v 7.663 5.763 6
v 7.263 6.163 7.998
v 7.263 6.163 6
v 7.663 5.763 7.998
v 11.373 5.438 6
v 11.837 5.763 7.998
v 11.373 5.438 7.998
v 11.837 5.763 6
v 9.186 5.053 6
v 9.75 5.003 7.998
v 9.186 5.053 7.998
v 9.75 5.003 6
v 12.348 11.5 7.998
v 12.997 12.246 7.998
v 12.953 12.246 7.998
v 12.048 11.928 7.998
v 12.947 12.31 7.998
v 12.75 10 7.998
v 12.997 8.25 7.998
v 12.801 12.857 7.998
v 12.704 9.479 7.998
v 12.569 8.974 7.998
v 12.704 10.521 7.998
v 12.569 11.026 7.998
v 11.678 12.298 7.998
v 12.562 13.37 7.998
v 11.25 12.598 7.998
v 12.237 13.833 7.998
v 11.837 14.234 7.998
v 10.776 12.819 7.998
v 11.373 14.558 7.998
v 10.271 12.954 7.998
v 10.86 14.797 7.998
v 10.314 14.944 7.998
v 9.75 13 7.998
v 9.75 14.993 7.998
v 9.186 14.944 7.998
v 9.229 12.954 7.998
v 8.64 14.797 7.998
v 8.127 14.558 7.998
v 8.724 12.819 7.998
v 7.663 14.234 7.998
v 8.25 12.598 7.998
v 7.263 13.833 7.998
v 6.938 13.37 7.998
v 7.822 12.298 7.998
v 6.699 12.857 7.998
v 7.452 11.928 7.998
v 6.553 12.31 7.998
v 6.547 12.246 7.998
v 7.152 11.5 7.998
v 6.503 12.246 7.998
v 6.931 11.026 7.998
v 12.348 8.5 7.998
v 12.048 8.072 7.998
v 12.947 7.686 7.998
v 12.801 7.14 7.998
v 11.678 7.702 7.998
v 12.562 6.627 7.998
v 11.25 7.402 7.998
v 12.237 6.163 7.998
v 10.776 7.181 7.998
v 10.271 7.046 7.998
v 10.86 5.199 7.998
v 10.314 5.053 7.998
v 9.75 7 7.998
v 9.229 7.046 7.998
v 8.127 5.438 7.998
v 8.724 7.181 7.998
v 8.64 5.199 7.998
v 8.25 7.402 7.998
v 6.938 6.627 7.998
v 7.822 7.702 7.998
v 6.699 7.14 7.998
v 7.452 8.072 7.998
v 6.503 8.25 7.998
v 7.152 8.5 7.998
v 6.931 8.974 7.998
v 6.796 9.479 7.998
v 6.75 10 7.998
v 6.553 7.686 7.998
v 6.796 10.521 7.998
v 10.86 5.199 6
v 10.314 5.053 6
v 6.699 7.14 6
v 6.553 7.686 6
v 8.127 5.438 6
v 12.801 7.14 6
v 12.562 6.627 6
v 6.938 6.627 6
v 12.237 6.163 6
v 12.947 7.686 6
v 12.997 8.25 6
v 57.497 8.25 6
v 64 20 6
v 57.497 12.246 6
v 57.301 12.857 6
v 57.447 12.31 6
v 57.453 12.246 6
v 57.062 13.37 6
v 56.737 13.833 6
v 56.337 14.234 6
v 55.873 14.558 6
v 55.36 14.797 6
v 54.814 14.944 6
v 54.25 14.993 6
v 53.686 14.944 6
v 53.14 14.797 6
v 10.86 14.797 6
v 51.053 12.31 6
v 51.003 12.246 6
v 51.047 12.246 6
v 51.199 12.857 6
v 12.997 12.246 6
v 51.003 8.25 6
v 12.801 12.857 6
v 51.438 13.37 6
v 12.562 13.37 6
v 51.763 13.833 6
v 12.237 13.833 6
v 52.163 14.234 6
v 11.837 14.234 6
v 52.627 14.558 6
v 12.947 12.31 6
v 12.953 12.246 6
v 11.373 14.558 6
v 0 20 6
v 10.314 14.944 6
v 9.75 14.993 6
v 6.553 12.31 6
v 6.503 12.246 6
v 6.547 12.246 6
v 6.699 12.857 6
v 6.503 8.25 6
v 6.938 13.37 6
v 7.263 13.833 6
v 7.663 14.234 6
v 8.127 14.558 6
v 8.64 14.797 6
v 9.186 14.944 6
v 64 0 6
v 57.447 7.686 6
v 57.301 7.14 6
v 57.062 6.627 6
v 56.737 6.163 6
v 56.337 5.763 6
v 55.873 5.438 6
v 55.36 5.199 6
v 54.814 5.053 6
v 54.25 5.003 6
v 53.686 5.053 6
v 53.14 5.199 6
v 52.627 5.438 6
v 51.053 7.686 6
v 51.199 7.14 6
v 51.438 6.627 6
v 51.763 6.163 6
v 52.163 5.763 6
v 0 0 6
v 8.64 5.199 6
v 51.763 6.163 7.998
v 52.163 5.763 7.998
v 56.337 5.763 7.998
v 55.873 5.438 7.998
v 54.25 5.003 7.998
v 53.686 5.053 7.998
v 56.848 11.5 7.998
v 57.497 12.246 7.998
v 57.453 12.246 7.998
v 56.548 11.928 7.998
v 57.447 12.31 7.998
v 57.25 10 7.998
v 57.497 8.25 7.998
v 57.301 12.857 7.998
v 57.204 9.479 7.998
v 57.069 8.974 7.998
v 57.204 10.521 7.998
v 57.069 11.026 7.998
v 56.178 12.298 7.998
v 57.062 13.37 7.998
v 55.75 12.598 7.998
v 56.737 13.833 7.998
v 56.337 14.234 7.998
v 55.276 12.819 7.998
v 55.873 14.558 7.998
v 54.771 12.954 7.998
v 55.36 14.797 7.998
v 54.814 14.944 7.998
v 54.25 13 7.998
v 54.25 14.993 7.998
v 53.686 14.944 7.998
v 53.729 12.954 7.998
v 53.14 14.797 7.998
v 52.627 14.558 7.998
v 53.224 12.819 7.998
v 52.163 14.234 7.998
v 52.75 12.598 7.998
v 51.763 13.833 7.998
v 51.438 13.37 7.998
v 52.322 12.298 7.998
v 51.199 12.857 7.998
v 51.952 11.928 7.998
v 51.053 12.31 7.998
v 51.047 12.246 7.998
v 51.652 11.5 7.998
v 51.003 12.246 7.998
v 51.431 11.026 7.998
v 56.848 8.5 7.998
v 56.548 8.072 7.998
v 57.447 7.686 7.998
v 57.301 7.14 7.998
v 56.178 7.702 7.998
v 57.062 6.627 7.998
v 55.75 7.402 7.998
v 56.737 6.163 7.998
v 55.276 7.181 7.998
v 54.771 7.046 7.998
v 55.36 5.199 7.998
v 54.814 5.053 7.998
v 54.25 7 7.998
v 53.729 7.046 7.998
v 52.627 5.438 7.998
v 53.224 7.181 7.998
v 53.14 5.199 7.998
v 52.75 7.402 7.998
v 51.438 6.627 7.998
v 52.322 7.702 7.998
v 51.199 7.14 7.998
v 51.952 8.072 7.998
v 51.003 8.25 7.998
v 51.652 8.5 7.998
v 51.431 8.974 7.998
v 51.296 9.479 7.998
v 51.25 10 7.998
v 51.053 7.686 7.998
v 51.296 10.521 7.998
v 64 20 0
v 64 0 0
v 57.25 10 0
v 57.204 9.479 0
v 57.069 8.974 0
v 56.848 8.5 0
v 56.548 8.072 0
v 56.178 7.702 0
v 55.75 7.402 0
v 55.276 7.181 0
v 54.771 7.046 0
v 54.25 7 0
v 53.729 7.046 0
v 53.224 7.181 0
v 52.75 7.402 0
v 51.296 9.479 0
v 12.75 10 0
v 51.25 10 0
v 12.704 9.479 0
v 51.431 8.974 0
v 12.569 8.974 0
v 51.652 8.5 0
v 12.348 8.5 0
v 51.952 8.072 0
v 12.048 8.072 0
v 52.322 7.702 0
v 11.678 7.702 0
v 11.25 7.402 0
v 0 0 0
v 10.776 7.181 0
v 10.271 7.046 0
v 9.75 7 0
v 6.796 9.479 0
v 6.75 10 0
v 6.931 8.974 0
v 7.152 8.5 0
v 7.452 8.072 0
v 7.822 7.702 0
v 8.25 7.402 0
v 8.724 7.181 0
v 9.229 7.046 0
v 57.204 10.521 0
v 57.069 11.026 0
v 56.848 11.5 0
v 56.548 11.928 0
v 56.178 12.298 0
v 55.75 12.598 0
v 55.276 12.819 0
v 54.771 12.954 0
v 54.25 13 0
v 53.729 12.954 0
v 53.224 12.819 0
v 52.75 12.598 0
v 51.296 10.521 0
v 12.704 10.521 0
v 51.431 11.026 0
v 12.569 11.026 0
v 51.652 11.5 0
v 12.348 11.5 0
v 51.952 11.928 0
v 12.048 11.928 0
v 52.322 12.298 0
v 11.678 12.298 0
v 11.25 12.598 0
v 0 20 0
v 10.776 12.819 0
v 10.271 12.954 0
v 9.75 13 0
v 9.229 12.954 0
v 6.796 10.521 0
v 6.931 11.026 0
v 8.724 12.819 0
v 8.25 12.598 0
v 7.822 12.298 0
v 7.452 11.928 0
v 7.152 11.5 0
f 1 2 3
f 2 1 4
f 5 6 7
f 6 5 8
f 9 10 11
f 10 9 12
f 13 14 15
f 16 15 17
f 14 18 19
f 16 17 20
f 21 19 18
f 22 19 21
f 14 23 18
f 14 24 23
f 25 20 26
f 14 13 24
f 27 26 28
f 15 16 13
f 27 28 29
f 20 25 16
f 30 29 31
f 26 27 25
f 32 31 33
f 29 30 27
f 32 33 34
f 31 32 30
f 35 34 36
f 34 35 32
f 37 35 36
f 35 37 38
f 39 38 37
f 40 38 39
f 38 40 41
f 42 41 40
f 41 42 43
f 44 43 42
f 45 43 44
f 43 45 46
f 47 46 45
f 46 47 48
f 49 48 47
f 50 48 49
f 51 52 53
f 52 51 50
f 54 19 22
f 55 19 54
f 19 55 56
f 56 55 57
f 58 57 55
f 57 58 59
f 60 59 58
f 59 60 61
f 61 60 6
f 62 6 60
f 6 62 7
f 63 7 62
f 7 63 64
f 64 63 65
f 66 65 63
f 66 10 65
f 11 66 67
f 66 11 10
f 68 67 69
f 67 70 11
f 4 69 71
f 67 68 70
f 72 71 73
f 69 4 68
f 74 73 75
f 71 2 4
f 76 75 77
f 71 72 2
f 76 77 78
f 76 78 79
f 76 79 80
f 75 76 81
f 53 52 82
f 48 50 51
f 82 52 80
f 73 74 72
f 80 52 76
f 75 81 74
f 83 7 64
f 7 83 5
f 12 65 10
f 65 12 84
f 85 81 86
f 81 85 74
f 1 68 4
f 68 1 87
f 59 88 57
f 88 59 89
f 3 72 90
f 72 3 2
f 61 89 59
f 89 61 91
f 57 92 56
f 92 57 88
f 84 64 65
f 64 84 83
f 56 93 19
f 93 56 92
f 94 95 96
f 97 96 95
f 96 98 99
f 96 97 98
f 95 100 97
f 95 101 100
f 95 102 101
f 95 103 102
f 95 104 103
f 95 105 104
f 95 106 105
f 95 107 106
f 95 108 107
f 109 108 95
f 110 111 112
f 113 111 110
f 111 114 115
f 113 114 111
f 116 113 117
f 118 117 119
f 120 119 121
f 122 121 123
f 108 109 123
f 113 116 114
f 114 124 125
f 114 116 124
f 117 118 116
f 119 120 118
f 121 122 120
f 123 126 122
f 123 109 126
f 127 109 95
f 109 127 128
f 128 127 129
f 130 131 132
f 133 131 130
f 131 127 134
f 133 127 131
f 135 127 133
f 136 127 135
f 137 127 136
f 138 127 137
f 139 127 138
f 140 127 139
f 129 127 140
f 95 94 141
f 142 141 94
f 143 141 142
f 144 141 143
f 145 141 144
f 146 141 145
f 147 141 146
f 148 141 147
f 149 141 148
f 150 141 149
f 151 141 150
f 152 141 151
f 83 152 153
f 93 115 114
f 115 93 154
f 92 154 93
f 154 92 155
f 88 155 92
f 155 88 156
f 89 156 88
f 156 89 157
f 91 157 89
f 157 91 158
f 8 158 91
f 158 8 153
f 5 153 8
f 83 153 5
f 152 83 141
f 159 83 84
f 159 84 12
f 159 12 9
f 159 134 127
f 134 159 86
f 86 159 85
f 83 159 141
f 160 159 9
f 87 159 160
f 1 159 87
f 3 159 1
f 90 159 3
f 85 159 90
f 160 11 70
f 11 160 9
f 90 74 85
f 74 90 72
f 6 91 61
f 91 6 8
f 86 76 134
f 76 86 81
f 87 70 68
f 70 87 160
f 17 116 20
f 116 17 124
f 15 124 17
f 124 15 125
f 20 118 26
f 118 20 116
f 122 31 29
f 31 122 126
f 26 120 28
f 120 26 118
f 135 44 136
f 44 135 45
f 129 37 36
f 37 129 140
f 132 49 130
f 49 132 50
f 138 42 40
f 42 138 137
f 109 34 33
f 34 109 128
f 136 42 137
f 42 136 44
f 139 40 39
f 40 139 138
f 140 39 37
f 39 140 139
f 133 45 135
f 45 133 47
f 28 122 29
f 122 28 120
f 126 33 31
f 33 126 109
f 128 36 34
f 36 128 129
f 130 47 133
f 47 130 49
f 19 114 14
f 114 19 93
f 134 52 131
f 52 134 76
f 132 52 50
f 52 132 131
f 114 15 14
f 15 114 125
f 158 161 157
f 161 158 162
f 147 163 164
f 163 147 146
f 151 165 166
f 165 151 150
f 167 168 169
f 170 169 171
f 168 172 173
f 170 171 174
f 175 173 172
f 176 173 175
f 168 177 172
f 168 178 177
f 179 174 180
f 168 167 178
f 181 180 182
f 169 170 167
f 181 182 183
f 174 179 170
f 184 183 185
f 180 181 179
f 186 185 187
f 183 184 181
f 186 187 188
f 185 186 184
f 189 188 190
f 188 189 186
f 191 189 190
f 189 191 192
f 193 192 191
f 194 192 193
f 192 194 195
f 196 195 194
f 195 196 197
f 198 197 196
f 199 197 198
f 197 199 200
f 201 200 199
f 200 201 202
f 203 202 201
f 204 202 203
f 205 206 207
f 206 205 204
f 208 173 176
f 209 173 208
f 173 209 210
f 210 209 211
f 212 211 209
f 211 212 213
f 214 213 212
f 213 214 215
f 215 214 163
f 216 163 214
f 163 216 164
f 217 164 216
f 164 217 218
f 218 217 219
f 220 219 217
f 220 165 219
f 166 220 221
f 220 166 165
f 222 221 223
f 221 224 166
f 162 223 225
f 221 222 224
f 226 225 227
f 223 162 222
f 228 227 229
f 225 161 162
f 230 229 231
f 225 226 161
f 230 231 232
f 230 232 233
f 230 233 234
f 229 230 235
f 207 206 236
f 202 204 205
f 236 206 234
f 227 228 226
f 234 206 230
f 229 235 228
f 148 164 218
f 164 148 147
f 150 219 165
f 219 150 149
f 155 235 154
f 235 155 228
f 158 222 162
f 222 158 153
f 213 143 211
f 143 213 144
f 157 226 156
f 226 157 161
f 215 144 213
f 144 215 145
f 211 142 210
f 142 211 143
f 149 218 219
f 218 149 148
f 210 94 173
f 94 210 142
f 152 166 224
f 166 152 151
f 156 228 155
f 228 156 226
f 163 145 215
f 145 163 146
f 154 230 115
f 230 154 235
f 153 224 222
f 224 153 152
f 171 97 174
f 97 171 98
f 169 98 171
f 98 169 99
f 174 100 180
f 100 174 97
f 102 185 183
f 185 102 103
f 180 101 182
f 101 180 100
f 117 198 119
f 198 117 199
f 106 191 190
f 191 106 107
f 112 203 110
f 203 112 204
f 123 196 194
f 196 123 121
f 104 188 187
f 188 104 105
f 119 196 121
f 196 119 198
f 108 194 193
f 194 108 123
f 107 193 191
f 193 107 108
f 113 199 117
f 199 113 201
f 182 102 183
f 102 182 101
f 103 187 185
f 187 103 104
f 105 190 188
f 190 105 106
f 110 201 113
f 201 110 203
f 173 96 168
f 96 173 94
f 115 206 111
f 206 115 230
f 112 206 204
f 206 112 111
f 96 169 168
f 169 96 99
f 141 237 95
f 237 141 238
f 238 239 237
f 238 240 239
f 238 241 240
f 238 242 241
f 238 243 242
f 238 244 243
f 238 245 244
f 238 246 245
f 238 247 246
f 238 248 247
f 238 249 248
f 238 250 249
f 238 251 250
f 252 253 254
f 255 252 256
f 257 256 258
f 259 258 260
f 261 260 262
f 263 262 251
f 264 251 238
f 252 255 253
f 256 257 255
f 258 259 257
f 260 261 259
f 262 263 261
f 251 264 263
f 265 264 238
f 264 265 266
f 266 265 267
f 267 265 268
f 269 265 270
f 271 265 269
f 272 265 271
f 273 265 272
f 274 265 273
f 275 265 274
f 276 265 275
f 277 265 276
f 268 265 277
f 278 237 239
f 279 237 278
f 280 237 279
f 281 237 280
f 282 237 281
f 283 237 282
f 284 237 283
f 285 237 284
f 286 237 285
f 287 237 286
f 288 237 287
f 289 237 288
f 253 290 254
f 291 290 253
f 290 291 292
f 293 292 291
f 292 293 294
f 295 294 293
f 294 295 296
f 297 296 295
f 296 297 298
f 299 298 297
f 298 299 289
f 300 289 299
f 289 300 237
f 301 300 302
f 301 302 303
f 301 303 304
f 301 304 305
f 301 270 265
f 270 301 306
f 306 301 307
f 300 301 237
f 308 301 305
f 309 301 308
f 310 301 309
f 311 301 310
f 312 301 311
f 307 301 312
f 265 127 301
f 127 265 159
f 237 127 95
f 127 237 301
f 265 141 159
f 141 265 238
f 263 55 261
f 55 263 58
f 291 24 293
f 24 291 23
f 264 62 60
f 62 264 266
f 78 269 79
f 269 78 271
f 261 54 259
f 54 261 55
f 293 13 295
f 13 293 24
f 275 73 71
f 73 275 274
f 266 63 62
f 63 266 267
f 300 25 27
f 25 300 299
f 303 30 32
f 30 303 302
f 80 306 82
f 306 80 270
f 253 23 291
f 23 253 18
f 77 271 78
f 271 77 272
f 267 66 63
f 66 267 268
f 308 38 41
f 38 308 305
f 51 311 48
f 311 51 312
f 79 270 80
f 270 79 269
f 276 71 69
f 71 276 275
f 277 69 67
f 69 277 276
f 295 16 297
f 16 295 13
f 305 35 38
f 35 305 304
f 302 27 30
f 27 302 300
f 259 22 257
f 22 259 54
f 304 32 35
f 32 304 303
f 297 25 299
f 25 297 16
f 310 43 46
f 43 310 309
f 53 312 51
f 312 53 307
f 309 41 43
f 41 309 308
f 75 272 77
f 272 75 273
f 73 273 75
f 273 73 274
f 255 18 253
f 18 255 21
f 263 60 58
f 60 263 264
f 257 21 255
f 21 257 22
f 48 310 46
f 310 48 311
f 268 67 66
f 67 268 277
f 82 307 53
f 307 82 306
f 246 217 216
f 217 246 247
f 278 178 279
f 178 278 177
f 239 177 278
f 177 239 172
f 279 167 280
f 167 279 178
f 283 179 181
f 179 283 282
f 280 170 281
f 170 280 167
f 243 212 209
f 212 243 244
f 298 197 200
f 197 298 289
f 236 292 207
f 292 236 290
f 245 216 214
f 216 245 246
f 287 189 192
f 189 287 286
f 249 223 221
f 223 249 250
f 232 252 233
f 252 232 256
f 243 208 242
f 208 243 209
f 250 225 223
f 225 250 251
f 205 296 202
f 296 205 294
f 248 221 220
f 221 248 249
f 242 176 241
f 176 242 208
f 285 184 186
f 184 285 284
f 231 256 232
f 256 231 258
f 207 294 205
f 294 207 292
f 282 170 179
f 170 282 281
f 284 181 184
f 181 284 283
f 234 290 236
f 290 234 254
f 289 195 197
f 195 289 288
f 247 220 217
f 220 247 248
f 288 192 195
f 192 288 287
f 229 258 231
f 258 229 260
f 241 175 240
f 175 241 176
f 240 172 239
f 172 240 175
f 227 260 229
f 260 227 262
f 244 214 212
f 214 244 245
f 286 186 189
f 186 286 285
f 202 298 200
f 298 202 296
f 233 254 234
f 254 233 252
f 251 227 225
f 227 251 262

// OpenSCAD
$fn=36;
//Durchmesser Beilagscheibe groß
dmbg=16;
a=64;
b=51;
c=38;
d=10;
e=6;
i=(a-b)/2;
//Durchmesser Loch Breite Solarpanel
k=(b-c)/2;
m=i+k/2;
h=d*2;
t=6;
//Dicke Verstaerkung
tv=2;

   
//    translate([(a-b)/2,0,0])
//    translate([e/2,h/2,0])
//    cylinder(h=t, d=e);
    
//    translate([-(a-b)/2,0,0])
//    translate([a-e/2,h/2,0])
//    cylinder(h=t, d=f);


module lochanlage()
{
    s=0.999;
    color("green")
    translate([0,-(10-k)/2,0])
    scale([s,s,s])
    {
        cylinder(h=tv, d=k);
        translate([0,10-k,0])
        cylinder(h=tv, d=k);
        translate([-k/2,0,0])
        cube([k,4,tv]);
    }
}

module verbindermitanlagenlochverstaerkung()
{
    cube([a,h,t]);
    
    translate([m,h/2,t])
    lochanlage();
    
    translate([a-m,h/2,t])
    lochanlage();
}

difference() {
    verbindermitanlagenlochverstaerkung();
    
    translate([m,h/2,0])
    cylinder(h=t+tv, d=e);
    
    translate([a-m,h/2,0])
    cylinder(h=t+tv, d=e);
}
